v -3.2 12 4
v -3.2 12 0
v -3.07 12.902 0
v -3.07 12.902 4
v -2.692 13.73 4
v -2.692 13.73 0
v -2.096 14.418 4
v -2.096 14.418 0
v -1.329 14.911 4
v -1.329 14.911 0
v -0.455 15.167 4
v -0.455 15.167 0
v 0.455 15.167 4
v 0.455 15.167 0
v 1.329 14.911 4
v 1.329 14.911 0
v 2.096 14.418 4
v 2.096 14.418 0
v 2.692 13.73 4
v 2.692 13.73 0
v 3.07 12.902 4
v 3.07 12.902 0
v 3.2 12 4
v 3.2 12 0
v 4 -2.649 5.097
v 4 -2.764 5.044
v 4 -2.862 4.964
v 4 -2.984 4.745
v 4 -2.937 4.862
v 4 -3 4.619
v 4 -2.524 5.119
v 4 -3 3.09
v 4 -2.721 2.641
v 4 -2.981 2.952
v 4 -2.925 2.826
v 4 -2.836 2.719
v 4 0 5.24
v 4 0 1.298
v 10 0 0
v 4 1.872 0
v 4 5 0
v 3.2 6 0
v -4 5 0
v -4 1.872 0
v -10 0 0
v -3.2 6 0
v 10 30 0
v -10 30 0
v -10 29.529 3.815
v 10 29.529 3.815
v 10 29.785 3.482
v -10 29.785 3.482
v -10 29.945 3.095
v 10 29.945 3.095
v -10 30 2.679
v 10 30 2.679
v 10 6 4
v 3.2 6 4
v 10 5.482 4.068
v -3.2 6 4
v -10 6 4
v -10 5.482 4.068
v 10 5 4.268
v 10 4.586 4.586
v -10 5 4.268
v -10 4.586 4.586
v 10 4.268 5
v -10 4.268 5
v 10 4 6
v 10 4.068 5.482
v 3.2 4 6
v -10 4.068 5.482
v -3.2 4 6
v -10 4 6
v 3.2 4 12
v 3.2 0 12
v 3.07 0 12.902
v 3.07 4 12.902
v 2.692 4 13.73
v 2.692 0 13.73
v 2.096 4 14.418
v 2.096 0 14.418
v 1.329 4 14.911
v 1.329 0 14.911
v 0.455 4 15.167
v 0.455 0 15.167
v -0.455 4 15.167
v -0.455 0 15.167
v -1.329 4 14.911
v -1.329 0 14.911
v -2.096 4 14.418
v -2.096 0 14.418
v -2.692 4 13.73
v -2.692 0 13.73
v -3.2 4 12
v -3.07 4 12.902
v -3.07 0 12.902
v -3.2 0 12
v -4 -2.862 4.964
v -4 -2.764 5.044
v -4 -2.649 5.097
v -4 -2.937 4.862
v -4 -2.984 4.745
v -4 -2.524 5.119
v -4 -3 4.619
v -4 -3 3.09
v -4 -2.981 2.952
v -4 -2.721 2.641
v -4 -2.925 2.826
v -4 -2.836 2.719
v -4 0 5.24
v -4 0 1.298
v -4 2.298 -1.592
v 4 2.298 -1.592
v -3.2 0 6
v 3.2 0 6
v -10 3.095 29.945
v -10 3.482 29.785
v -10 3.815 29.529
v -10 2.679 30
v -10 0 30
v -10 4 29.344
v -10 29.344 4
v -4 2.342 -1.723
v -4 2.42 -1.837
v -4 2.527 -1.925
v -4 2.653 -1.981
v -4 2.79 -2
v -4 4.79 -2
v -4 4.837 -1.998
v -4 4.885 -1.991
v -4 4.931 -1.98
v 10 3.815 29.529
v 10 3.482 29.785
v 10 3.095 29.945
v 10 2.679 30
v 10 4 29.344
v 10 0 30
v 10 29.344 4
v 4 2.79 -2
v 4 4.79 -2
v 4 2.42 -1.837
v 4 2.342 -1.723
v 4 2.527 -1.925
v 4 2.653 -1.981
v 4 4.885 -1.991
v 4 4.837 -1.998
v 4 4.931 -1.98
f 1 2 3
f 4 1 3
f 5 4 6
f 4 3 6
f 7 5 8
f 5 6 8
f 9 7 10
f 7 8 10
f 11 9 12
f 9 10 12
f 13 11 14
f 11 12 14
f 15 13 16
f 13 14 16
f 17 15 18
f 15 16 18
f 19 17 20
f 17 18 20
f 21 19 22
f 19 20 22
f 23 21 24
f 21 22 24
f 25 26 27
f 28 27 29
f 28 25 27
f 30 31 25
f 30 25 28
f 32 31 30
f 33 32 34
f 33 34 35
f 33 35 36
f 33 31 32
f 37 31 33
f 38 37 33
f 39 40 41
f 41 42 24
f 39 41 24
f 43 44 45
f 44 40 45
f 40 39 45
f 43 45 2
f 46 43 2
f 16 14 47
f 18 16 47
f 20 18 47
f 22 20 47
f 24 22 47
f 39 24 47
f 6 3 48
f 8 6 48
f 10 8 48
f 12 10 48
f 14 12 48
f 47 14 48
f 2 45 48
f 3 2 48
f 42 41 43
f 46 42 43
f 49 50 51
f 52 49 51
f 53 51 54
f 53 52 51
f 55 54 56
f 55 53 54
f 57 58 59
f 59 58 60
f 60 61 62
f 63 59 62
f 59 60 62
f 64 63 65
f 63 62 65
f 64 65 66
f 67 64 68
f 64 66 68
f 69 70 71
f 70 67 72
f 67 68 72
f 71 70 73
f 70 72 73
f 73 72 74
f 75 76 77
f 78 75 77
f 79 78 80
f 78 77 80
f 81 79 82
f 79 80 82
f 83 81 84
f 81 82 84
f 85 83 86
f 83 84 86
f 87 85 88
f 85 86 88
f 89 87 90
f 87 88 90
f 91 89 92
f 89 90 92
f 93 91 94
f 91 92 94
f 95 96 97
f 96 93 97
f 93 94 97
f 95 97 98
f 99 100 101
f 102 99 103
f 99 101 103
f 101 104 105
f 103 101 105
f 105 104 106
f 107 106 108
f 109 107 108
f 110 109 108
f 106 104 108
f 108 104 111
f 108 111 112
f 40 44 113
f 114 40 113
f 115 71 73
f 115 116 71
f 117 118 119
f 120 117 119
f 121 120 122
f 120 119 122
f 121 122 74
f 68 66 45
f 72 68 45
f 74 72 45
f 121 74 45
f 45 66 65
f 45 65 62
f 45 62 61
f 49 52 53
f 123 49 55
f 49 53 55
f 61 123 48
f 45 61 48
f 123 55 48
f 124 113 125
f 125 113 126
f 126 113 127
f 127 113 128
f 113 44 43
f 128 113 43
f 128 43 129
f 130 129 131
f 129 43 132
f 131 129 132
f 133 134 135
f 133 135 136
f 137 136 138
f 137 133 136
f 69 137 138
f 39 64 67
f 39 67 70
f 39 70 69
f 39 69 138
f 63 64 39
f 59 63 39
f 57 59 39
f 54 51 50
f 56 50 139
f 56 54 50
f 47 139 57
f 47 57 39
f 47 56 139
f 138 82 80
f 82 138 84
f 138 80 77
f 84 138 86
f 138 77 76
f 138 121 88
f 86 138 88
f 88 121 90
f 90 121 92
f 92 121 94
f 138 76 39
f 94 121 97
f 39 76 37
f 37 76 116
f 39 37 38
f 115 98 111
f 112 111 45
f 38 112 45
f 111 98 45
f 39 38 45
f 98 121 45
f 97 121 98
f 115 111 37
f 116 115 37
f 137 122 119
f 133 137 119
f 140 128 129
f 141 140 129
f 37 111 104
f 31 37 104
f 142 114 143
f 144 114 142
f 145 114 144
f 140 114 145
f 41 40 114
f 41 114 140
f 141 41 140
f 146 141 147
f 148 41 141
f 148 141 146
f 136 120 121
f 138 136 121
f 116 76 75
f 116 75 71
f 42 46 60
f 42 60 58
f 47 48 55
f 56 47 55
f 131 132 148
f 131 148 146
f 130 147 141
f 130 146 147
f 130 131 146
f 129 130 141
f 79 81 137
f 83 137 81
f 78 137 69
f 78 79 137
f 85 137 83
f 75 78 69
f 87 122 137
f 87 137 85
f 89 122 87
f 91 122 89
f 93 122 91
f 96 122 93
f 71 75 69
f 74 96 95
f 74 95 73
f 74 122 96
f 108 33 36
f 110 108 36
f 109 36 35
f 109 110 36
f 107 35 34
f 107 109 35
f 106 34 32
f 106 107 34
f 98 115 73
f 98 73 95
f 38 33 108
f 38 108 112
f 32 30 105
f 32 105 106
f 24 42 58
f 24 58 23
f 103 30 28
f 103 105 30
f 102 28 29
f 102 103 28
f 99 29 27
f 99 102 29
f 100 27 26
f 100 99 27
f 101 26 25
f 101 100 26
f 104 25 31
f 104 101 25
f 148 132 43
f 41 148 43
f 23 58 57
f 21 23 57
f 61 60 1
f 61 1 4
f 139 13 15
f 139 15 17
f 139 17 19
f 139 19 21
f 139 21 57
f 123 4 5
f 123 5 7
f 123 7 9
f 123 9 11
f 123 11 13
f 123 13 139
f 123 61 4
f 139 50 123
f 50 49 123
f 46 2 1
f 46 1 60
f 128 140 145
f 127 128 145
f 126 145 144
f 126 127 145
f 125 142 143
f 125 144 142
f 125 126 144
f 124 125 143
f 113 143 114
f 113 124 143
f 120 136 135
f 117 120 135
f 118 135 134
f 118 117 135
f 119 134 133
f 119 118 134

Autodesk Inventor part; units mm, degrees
ref_plane "YZ Plane" through (0, 0, 0) normal (1, 0, 0) x (0, 1, 0)
ref_plane "XZ Plane" through (0, 0, 0) normal (0, 1, 0) x (-1, 0, 0)
sketch "_____1" plane through (0, 0, 0) normal (1, 0, 0) x (0, 0, -1)
  line L0 (-30, 2.6786) -> (-30, 0)
  line L1 (-30, 0) -> (0, 0)
  line L2 (0, 0) -> (0, 30)
  line L3 (0, 30) -> (-2.6786, 30)
  arc A0 (-2.6786, 30) -> (-3.815, 29.5293) centre (-2.6786, 28.3929) ccw
  line L4 (-3.815, 29.5293) -> (-29.5293, 3.815)
  arc A1 (-29.5293, 3.815) -> (-30, 2.6786) centre (-28.3929, 2.6786) ccw
  dimension "d42" = 30
extrude "Extrusion1" add sketch "_____1" along normal mid plane 20
sketch "_____2" plane through (0, 0, 0) normal (1, 0, 0) x (0, 0, -1)
  line L0 (-32, 32) -> (-32, 4)
  line L1 (-32, 4) -> (-6, 4)
  arc A0 (-6, 4) -> (-4, 6) centre (-6, 6) ccw
  line L2 (-4, 6) -> (-4, 32)
  line L3 (-4, 32) -> (-32, 32)
extrude "Extrusion2" cut sketch "_____2" along normal mid plane 30
sketch "_____9" plane through (0, 0, 0) normal (1, 0, 0) x (0, 0, -1)
  line L0 (0, 5) -> (0, 1.8718)
  line L1 (0, 1.8718) -> (1.592, 2.2984)
  arc A0 (1.592, 2.2984) -> (2, 2.7898) centre (1.5, 2.7898) ccw
  line L2 (2, 2.7898) -> (2, 4.7898)
  arc A1 (2, 4.7898) -> (1.9797, 4.9309) centre (1.5, 4.7898) ccw
  line L3 (1.9797, 4.9309) -> (0, 5)
  line L4 (-30, 0) -> (0, 0) projected
  line L5 (0, 0) -> (0, 30) projected
  dimension "d34" = 0.5
  dimension "d35" = 0.5
  dimension "d36" = 15
  dimension "d37" = 2
  dimension "d38" = 2
  dimension "d40" = 2
  dimension "d41" = 5
extrude "Extrusion3" add sketch "_____9" along normal mid plane 8
sketch "_____10" plane through (0, 0, 0) normal (1, 0, 0) x (0, 0, -1)
  line L0 (-5.2401, 0) -> (-5.1188, -2.524)
  arc A0 (-5.1188, -2.524) -> (-4.6194, -3) centre (-4.6194, -2.5) ccw
  line L1 (-4.6194, -3) -> (-3.0897, -3)
  arc A1 (-3.0897, -3) -> (-2.6413, -2.7213) centre (-3.0897, -2.5) ccw
  line L2 (-2.6413, -2.7213) -> (-1.298, 0)
  line L3 (-1.298, 0) -> (-5.2401, 0)
  line L4 (0, 0) -> (-30, 0) projected
  line L5 (0, 30) -> (0, 0) projected
  dimension "d26" = 0.5
  dimension "d27" = 0.5
  dimension "d28" = 3
  dimension "d29" = 2.749
extrude "Extrusion4" add sketch "_____10" along normal mid plane 8
sketch "_____3" plane through (0, 0, 0) normal (0, 1, 0) x (1, 0, 0)
  arc A0 (-3.2, -12) -> (3.2, -12) centre (0, -12) ccw
  line L0 (3.2, -12) -> (3.2, -6)
  line L1 (3.2, -6) -> (-3.2, -6)
  line L2 (-3.2, -6) -> (-3.2, -12)
  line L3 (-10, 0) -> (10, 0) projected
  line L4 (0, -6) -> (0, 0) construction
  point P0 (-3.2, -9)
  point P1 (3.2, -9)
  dimension "d23" = 3.2
  dimension "d24" = 6
  dimension "d25" = 6
extrude "Extrusion5" cut sketch "_____3" along normal blind 4
ref_plane "Work Plane7" through (-10, 4, 4) normal (0, 0.7071, -0.7071) x (-1, 0, 0)
mirror "Mirror1" about plane through (-10, 4, 4) normal (0, 0.7071, -0.7071) of "Extrusion5"
properties part number "HBLFSR5_b" material "Acetal Resin, Black"
